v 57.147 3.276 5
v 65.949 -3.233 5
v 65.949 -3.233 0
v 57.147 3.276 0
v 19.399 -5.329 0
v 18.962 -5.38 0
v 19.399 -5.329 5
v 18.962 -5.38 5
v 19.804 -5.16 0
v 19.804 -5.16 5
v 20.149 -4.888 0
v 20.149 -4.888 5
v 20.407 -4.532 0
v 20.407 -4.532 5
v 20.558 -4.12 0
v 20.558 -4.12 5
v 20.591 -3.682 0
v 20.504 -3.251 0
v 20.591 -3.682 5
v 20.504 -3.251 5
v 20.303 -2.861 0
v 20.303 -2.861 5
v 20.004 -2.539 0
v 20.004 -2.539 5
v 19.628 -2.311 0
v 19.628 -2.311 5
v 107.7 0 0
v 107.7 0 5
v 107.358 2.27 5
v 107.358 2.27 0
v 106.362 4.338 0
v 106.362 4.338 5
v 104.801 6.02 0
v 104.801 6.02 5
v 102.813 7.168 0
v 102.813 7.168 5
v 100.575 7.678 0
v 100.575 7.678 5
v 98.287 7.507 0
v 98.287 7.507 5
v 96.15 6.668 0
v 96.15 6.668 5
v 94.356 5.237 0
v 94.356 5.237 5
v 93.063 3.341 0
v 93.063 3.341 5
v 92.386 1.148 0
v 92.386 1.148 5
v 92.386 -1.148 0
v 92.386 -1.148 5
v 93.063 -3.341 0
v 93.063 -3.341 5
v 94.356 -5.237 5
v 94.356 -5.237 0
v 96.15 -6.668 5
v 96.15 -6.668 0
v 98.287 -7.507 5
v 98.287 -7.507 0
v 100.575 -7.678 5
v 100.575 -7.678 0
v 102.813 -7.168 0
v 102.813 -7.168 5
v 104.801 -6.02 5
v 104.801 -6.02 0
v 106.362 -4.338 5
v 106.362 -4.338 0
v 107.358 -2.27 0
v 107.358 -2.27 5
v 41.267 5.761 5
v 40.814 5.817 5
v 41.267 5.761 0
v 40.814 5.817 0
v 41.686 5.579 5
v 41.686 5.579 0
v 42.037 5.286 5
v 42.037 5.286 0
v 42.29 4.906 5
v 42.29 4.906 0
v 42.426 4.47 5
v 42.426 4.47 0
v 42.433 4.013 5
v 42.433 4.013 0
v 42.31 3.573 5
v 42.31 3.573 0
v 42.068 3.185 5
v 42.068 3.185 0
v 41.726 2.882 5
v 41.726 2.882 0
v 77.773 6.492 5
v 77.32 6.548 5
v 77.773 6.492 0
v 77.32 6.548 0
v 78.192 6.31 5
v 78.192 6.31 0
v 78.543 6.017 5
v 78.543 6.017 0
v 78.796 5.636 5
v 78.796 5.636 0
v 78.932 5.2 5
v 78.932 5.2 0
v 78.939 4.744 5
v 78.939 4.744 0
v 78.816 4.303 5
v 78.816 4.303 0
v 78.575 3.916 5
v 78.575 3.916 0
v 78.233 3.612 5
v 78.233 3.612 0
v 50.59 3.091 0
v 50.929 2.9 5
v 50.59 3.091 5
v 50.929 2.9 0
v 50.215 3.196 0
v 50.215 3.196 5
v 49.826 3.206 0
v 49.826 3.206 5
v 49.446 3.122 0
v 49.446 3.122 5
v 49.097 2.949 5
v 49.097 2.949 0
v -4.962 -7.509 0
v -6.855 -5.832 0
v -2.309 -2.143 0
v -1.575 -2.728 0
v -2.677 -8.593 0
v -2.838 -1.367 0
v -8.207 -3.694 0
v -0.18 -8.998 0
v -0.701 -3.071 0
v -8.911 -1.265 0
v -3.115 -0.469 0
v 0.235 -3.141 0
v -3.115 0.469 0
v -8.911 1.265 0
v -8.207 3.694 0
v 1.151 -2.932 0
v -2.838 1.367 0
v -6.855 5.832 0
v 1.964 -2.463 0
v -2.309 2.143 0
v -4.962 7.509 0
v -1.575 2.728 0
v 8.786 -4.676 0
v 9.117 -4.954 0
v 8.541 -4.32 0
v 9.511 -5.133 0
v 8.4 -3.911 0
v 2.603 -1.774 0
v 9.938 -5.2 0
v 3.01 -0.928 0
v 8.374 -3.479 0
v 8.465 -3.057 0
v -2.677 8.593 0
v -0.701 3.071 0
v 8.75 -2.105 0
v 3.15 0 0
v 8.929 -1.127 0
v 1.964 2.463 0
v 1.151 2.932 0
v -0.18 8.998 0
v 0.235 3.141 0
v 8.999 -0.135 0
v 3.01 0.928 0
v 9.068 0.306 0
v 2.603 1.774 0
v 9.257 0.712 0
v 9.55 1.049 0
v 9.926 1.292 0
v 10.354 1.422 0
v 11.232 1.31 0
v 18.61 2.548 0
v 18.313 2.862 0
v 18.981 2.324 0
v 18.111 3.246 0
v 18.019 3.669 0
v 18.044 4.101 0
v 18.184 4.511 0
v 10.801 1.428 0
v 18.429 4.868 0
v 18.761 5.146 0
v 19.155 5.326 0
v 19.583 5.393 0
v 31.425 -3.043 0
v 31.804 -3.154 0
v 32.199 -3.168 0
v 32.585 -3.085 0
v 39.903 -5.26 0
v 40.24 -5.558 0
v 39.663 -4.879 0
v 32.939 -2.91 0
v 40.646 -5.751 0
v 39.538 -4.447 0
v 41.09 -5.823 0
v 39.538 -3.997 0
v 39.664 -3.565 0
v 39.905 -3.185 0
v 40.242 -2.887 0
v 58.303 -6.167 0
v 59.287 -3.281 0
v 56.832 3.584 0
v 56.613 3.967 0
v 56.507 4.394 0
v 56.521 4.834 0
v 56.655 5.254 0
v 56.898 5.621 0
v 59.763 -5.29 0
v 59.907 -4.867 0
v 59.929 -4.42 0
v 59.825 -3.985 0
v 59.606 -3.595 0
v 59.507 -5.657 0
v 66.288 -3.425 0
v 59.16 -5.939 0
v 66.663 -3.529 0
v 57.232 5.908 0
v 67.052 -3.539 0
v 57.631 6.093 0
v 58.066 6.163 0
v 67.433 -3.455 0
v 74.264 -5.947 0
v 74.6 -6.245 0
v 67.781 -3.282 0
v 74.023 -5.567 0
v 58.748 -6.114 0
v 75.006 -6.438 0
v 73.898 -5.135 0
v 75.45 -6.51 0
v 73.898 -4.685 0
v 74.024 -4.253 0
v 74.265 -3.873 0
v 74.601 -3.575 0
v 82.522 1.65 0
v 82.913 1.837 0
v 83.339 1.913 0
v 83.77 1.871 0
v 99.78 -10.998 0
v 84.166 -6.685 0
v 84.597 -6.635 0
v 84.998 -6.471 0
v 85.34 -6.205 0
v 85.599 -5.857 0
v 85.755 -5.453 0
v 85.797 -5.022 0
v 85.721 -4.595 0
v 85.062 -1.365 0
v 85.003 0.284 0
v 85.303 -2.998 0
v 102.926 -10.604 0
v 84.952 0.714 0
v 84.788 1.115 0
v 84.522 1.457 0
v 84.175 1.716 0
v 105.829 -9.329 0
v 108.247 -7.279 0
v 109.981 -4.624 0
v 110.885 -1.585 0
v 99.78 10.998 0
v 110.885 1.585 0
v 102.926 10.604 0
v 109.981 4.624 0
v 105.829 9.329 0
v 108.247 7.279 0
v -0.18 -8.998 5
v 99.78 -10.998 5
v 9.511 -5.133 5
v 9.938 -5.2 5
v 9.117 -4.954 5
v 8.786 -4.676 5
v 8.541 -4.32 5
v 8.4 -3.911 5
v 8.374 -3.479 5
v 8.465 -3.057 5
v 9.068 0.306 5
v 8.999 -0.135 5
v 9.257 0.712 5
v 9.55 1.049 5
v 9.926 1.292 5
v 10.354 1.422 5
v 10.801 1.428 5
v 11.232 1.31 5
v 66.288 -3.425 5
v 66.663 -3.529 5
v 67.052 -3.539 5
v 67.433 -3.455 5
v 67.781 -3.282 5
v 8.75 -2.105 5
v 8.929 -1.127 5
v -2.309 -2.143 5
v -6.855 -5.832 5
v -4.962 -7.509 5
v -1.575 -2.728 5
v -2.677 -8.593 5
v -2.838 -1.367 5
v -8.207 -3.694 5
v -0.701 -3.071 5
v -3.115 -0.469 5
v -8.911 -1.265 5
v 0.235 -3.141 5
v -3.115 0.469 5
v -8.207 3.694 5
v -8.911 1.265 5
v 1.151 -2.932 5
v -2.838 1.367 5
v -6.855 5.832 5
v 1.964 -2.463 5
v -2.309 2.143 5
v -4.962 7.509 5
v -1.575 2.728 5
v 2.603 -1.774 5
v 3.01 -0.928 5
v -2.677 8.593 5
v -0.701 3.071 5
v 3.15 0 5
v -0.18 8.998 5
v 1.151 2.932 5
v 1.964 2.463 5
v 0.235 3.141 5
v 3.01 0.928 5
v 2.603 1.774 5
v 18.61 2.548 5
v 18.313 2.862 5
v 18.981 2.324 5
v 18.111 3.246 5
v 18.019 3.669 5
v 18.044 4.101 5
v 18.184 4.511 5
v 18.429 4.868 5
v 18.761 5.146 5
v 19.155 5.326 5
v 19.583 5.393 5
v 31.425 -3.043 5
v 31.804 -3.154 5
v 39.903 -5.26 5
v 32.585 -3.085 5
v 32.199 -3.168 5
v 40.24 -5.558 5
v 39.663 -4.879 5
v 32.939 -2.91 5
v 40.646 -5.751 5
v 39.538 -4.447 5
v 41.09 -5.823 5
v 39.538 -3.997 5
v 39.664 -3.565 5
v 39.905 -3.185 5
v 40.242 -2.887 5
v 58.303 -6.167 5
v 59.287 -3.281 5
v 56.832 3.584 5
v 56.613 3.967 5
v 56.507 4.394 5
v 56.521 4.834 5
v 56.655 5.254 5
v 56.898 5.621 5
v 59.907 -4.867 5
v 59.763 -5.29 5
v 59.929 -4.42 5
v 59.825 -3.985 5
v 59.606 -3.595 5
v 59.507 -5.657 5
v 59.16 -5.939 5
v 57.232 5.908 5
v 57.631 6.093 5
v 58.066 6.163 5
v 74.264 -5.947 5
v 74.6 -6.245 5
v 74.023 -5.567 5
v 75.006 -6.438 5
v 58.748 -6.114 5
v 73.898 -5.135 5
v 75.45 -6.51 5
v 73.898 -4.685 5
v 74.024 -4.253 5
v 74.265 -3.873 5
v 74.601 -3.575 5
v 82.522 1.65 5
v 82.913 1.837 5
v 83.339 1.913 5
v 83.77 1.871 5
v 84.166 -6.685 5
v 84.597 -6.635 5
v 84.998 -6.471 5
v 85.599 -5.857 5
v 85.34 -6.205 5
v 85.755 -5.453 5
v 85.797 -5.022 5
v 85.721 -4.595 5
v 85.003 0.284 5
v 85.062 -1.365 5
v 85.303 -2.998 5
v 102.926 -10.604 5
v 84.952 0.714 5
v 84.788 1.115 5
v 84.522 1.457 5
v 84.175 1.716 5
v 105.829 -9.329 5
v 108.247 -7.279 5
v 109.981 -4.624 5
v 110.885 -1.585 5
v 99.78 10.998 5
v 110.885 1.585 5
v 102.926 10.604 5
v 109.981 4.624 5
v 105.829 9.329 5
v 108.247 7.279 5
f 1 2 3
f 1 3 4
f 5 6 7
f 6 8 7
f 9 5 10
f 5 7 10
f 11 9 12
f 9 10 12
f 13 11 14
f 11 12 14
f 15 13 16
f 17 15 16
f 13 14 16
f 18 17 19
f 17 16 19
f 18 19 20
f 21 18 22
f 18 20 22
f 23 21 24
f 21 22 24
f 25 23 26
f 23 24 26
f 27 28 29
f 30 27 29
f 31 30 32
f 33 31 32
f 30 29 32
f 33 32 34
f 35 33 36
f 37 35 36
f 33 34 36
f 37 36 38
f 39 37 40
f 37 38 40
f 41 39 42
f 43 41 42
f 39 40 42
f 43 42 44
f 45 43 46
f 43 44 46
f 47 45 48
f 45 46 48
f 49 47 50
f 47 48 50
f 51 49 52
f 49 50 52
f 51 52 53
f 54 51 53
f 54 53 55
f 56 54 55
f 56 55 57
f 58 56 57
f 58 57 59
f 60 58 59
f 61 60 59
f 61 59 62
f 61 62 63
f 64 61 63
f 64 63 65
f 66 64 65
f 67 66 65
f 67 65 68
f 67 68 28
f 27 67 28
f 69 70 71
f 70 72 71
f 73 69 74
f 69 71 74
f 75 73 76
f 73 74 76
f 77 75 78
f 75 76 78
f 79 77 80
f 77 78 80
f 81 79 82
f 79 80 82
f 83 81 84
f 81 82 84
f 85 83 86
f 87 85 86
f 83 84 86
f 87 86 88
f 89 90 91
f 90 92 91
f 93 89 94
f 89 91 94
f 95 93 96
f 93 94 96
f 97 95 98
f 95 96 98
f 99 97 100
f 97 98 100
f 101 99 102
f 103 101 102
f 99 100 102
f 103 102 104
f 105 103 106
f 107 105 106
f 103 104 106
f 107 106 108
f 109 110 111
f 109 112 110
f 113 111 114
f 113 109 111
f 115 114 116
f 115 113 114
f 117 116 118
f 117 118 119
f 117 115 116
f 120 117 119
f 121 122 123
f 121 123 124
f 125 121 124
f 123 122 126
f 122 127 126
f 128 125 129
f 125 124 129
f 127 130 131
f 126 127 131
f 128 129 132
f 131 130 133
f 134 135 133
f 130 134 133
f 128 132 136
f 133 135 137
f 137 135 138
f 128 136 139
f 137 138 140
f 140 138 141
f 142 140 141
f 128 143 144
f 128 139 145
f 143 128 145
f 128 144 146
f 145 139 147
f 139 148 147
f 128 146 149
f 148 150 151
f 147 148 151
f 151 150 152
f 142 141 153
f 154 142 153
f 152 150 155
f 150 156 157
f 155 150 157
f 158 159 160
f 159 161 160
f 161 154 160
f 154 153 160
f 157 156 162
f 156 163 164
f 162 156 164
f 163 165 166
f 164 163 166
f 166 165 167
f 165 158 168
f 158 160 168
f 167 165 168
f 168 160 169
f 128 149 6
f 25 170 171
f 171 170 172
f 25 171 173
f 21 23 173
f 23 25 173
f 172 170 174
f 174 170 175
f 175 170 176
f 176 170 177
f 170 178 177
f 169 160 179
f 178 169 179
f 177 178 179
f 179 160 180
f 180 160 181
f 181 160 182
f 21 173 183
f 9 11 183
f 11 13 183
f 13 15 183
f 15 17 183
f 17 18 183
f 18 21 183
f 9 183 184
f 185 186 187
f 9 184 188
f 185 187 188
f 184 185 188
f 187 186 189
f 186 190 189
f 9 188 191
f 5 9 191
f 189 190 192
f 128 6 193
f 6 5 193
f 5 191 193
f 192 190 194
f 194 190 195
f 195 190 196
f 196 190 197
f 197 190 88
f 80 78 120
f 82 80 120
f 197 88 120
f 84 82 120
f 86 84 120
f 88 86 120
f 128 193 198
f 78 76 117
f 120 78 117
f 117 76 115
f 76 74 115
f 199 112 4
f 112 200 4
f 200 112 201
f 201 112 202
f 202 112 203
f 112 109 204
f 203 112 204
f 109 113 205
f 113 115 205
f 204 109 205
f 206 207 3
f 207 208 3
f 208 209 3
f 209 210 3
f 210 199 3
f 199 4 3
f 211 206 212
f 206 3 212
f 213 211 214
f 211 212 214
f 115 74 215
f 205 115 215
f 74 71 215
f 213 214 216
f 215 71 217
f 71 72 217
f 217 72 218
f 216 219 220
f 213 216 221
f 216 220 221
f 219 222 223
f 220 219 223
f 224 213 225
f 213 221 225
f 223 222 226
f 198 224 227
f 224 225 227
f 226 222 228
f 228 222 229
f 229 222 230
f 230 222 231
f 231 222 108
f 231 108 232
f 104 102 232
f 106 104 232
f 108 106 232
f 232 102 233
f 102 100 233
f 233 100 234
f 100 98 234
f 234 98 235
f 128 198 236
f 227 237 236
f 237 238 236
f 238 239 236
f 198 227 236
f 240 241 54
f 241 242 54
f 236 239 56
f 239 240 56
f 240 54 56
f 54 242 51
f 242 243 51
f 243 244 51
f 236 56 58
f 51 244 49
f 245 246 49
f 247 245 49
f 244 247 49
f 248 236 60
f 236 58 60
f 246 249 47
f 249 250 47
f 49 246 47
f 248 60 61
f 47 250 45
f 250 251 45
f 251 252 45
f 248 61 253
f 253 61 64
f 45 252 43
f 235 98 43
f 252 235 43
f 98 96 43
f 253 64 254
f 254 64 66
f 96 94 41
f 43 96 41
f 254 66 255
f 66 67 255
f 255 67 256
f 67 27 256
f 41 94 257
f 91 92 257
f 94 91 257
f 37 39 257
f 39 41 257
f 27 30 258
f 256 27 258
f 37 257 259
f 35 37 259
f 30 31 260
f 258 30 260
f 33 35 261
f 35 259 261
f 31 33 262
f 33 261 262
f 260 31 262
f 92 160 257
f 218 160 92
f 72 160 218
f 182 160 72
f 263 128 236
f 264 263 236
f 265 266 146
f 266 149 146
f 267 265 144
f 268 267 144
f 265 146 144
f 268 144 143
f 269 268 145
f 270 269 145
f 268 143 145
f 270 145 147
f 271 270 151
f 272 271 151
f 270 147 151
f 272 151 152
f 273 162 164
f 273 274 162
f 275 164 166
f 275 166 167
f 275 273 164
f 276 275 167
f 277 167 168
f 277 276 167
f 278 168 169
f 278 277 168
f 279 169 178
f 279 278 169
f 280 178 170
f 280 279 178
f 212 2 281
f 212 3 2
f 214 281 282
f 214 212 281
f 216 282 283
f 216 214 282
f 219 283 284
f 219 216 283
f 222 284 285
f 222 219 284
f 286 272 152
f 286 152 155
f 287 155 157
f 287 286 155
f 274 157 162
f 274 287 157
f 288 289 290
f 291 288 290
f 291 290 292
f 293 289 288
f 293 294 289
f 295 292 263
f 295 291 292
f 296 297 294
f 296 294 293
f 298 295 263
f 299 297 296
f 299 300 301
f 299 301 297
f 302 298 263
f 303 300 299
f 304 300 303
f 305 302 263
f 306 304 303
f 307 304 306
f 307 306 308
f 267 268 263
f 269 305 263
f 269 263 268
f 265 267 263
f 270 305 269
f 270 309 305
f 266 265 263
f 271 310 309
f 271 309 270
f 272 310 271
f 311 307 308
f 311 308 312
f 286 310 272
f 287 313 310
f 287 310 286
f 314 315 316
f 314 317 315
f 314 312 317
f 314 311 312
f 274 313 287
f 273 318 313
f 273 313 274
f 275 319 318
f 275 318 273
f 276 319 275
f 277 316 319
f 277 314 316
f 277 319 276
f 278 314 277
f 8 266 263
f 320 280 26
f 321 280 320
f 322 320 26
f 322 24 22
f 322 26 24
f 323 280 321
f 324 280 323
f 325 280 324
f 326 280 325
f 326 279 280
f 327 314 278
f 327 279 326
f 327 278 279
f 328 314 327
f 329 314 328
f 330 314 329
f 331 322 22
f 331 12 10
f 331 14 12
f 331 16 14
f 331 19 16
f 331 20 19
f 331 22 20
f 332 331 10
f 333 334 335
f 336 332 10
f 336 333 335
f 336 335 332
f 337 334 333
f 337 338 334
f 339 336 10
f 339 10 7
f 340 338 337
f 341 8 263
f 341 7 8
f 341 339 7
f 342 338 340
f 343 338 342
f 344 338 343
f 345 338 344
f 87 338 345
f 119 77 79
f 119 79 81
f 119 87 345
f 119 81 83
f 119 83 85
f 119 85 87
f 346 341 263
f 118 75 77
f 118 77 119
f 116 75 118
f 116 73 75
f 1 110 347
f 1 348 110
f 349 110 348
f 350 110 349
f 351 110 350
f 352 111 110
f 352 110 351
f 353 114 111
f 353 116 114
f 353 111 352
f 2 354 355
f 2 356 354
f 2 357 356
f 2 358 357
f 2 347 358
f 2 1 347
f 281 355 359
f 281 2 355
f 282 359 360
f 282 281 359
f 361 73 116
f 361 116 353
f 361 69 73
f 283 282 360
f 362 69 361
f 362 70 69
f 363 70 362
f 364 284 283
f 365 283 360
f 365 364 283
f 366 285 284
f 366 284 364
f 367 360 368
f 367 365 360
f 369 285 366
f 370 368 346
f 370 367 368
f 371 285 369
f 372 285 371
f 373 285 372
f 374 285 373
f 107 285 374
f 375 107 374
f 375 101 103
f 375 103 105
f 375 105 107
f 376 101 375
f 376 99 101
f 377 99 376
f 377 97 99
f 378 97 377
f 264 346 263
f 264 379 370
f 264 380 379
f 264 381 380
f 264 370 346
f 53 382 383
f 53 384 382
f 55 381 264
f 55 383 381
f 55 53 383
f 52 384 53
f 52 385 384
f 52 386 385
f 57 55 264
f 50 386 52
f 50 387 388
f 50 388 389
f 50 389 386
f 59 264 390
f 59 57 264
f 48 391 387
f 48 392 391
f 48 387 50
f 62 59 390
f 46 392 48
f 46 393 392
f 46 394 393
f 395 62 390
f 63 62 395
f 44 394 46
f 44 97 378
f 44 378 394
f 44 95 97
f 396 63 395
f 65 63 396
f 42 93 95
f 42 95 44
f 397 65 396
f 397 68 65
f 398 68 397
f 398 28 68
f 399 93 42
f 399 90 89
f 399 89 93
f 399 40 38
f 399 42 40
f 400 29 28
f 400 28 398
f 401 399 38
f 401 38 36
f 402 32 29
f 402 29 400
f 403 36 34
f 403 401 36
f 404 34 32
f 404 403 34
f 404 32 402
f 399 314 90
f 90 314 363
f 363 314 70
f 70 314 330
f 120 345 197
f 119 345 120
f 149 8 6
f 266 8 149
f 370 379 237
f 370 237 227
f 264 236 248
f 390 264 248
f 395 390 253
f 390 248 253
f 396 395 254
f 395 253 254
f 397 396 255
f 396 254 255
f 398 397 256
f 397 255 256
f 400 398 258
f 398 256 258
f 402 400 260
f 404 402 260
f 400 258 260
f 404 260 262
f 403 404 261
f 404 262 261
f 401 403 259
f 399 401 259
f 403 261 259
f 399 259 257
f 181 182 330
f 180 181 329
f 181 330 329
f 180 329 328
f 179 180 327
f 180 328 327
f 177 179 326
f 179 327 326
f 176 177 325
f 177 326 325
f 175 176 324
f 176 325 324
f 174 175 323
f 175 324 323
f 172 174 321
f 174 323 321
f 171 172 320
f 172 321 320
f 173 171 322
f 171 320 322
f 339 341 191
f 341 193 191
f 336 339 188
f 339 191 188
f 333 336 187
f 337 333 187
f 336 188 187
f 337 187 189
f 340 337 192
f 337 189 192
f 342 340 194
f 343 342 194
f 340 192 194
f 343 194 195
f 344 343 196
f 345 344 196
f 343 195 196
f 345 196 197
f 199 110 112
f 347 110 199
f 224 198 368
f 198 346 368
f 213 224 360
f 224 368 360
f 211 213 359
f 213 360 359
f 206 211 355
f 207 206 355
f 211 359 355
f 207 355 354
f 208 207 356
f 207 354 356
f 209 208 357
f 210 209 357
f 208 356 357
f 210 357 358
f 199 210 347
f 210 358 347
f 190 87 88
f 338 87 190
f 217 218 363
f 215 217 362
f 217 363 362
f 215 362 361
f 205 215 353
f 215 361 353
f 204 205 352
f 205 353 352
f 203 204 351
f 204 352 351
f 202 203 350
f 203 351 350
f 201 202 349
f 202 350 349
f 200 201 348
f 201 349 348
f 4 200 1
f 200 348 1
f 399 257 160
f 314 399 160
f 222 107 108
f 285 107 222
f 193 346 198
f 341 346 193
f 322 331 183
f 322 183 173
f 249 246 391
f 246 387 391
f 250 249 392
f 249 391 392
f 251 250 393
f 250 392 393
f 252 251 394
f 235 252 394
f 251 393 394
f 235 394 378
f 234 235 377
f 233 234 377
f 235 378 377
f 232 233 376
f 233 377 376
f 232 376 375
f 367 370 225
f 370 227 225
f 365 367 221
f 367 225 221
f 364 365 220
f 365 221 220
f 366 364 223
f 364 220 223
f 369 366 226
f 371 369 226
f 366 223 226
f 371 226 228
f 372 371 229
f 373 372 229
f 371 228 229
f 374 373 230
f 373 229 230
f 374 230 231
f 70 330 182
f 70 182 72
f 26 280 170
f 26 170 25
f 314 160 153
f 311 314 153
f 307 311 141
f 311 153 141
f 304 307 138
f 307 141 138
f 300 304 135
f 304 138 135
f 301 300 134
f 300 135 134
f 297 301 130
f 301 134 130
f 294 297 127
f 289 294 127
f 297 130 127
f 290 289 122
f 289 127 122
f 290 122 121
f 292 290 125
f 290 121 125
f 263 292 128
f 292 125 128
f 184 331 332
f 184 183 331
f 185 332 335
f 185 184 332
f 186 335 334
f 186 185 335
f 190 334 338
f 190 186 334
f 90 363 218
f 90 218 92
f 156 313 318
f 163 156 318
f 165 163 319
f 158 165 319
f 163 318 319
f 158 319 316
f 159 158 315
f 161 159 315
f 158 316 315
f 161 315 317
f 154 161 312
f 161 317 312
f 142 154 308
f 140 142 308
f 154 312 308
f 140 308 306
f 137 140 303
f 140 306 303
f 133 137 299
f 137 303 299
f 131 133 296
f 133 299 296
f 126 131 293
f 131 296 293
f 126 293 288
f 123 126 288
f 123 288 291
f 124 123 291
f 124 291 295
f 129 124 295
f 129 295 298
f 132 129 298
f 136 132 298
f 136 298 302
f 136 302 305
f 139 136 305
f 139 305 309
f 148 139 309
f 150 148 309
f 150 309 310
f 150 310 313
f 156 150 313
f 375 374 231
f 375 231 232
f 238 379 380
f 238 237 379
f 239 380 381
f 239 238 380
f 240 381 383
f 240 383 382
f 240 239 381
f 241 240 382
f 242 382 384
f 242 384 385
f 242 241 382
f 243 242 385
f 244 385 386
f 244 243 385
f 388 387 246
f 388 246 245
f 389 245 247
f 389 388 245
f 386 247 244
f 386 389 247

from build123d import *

# Parameters (mm, degrees)
EXTRUDE_1_DEPTH     = 5
SKETCH_2_R          = 3.15
CUT_EXTRUDE_1_DEPTH = 112.655720857
SKETCH_3_R          = 7.7
CUT_EXTRUDE_2_DEPTH = 112.655720857
CUT_EXTRUDE_3_DEPTH = 112.655720857
EXTRUDE_1_2_DEPTH   = 5
FILLET_1_R          = 1.6


with BuildPart() as part:
    # 草图1 → Extrude 1 (new body)
    with BuildSketch(Plane.XY):
        with BuildLine():
            Line((-0.18, -8.99819982), (99.78, -10.99779978))
            ThreePointArc((99.78, -10.99779978), (111, 0), (99.78, 10.99779978))
            Line((99.78, 10.99779978), (-0.18, 8.99819982))
            ThreePointArc((-0.18, 8.99819982), (-9, 0), (-0.18, -8.99819982))
        make_face()
    extrude(amount=EXTRUDE_1_DEPTH)

    # 草图2 → 切除-拉伸1 (cut, through all)
    with BuildSketch(Plane.XY.offset(5)):
        Circle(SKETCH_2_R)
    extrude(amount=-CUT_EXTRUDE_1_DEPTH, mode=Mode.SUBTRACT)

    # 草图3 → 切除-拉伸2 (cut, through all)
    with BuildSketch(Plane.XY.offset(5)):
        with Locations((100, 0)):
            Circle(SKETCH_3_R)
    extrude(amount=-CUT_EXTRUDE_2_DEPTH, mode=Mode.SUBTRACT)

    # 草图4 → 切除-拉伸3 (cut, through all)
    with BuildSketch(Plane.XY.offset(5)):
        with BuildLine():
            Line((7.381817961, 5.148666195), (86.596154404, 6.733269877))
            ThreePointArc((86.596154404, 6.733269877), (85, 0), (86.596154404, -6.733269877))
            Line((86.596154404, -6.733269877), (7.381817961, -5.148666195))
            ThreePointArc((7.381817961, -5.148666195), (9, 0), (7.381817961, 5.148666195))
        make_face()
    extrude(amount=-CUT_EXTRUDE_3_DEPTH, mode=Mode.SUBTRACT)

    # 草图5 → Extrude 1 2 (add, through all)
    with BuildSketch(Plane.XY.offset(5)):
        Polygon((6.589719105, 3.31220781), (32.616219561, -7.91350871), (50.030218058, 3.564346875), (66.717027477, -8.776023625), (87.697436335, 5.063785493), (85.494872472, 8.40275426), (66.847877099, -3.897809486), (50.161963875, 8.441898252), (32.217750586, -3.385430707), (8.173916817, 6.985124581), align=None)
    extrude(amount=-EXTRUDE_1_2_DEPTH)

    # 圆角1
    fillet_1_edges = [part.edges().sort_by_distance(p)[0] for p in [
        (7.381817961, -5.148666195, 2.5),
        (86.596154404, -6.733269877, 2.5),
        (27.121513236, -5.543539083, 2.5),
        (35.944131409, -5.720026748, 2.5),
        (63.325320924, -6.267760096, 2.5),
        (70.307680542, -6.407435226, 2.5),
        (82.850434699, 6.658340495, 2.5),
        (53.37111962, 6.068636241, 2.5),
        (46.348147736, 5.928148703, 2.5),
        (12.20786682, 5.245206483, 2.5),
        (32.217750586, -3.385430707, 2.5),
        (66.847877099, -3.897809486, 2.5),
        (85.430653574, 3.56849334, 2.5),
        (50.030218058, 3.564346875, 2.5),
        (8.669944071, 2.414967867, 2.5),
    ]]
    fillet(fillet_1_edges, radius=FILLET_1_R)


solid = part.part
